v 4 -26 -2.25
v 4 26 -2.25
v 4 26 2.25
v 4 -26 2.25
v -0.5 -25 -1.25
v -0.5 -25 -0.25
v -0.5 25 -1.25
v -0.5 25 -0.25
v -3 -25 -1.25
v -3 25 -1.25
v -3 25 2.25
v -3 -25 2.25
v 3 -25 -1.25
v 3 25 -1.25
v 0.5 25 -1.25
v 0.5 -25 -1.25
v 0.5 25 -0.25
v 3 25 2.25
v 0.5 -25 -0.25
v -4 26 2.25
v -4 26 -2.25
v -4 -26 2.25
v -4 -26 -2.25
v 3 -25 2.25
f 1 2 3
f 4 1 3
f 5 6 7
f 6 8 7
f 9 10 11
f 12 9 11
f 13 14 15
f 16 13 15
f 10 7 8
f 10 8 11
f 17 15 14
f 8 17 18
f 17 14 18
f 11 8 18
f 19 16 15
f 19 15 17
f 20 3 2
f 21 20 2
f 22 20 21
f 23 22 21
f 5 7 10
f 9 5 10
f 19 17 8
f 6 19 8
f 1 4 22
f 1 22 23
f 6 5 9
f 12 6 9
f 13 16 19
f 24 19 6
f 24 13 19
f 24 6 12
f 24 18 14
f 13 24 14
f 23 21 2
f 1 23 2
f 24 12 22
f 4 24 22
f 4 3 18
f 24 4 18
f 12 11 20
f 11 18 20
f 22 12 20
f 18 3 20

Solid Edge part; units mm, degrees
sketch "Sketch1" plane through (0, 0, 0) normal (0, -1, 0) x (1, 0, 0)
  line L0 (4, -2.25) -> (4, 2.25)
  line L1 (4, 2.25) -> (-4, 2.25)
  line L2 (-4, 2.25) -> (-4, -2.25)
  line L3 (-4, -2.25) -> (4, -2.25)
extrude "Protrusion1" add sketch "Sketch1" along normal mid plane 52
sketch "Sketch2" plane through (0, 0, 0) normal (0, -1, 0) x (1, 0, 0)
  line L0 (-3, -1.25) -> (-3, 2.25)
  line L1 (-3, 2.25) -> (3, 2.25)
  line L2 (3, 2.25) -> (3, -1.25)
  line L3 (3, -1.25) -> (0.5, -1.25)
  line L4 (0.5, -1.25) -> (0.5, -0.25)
  line L5 (0.5, -0.25) -> (-0.5, -0.25)
  line L6 (-0.5, -0.25) -> (-0.5, -1.25)
  line L7 (-0.5, -1.25) -> (-3, -1.25)
extrude "Cutout1" cut sketch "Sketch2" along normal mid plane 50
